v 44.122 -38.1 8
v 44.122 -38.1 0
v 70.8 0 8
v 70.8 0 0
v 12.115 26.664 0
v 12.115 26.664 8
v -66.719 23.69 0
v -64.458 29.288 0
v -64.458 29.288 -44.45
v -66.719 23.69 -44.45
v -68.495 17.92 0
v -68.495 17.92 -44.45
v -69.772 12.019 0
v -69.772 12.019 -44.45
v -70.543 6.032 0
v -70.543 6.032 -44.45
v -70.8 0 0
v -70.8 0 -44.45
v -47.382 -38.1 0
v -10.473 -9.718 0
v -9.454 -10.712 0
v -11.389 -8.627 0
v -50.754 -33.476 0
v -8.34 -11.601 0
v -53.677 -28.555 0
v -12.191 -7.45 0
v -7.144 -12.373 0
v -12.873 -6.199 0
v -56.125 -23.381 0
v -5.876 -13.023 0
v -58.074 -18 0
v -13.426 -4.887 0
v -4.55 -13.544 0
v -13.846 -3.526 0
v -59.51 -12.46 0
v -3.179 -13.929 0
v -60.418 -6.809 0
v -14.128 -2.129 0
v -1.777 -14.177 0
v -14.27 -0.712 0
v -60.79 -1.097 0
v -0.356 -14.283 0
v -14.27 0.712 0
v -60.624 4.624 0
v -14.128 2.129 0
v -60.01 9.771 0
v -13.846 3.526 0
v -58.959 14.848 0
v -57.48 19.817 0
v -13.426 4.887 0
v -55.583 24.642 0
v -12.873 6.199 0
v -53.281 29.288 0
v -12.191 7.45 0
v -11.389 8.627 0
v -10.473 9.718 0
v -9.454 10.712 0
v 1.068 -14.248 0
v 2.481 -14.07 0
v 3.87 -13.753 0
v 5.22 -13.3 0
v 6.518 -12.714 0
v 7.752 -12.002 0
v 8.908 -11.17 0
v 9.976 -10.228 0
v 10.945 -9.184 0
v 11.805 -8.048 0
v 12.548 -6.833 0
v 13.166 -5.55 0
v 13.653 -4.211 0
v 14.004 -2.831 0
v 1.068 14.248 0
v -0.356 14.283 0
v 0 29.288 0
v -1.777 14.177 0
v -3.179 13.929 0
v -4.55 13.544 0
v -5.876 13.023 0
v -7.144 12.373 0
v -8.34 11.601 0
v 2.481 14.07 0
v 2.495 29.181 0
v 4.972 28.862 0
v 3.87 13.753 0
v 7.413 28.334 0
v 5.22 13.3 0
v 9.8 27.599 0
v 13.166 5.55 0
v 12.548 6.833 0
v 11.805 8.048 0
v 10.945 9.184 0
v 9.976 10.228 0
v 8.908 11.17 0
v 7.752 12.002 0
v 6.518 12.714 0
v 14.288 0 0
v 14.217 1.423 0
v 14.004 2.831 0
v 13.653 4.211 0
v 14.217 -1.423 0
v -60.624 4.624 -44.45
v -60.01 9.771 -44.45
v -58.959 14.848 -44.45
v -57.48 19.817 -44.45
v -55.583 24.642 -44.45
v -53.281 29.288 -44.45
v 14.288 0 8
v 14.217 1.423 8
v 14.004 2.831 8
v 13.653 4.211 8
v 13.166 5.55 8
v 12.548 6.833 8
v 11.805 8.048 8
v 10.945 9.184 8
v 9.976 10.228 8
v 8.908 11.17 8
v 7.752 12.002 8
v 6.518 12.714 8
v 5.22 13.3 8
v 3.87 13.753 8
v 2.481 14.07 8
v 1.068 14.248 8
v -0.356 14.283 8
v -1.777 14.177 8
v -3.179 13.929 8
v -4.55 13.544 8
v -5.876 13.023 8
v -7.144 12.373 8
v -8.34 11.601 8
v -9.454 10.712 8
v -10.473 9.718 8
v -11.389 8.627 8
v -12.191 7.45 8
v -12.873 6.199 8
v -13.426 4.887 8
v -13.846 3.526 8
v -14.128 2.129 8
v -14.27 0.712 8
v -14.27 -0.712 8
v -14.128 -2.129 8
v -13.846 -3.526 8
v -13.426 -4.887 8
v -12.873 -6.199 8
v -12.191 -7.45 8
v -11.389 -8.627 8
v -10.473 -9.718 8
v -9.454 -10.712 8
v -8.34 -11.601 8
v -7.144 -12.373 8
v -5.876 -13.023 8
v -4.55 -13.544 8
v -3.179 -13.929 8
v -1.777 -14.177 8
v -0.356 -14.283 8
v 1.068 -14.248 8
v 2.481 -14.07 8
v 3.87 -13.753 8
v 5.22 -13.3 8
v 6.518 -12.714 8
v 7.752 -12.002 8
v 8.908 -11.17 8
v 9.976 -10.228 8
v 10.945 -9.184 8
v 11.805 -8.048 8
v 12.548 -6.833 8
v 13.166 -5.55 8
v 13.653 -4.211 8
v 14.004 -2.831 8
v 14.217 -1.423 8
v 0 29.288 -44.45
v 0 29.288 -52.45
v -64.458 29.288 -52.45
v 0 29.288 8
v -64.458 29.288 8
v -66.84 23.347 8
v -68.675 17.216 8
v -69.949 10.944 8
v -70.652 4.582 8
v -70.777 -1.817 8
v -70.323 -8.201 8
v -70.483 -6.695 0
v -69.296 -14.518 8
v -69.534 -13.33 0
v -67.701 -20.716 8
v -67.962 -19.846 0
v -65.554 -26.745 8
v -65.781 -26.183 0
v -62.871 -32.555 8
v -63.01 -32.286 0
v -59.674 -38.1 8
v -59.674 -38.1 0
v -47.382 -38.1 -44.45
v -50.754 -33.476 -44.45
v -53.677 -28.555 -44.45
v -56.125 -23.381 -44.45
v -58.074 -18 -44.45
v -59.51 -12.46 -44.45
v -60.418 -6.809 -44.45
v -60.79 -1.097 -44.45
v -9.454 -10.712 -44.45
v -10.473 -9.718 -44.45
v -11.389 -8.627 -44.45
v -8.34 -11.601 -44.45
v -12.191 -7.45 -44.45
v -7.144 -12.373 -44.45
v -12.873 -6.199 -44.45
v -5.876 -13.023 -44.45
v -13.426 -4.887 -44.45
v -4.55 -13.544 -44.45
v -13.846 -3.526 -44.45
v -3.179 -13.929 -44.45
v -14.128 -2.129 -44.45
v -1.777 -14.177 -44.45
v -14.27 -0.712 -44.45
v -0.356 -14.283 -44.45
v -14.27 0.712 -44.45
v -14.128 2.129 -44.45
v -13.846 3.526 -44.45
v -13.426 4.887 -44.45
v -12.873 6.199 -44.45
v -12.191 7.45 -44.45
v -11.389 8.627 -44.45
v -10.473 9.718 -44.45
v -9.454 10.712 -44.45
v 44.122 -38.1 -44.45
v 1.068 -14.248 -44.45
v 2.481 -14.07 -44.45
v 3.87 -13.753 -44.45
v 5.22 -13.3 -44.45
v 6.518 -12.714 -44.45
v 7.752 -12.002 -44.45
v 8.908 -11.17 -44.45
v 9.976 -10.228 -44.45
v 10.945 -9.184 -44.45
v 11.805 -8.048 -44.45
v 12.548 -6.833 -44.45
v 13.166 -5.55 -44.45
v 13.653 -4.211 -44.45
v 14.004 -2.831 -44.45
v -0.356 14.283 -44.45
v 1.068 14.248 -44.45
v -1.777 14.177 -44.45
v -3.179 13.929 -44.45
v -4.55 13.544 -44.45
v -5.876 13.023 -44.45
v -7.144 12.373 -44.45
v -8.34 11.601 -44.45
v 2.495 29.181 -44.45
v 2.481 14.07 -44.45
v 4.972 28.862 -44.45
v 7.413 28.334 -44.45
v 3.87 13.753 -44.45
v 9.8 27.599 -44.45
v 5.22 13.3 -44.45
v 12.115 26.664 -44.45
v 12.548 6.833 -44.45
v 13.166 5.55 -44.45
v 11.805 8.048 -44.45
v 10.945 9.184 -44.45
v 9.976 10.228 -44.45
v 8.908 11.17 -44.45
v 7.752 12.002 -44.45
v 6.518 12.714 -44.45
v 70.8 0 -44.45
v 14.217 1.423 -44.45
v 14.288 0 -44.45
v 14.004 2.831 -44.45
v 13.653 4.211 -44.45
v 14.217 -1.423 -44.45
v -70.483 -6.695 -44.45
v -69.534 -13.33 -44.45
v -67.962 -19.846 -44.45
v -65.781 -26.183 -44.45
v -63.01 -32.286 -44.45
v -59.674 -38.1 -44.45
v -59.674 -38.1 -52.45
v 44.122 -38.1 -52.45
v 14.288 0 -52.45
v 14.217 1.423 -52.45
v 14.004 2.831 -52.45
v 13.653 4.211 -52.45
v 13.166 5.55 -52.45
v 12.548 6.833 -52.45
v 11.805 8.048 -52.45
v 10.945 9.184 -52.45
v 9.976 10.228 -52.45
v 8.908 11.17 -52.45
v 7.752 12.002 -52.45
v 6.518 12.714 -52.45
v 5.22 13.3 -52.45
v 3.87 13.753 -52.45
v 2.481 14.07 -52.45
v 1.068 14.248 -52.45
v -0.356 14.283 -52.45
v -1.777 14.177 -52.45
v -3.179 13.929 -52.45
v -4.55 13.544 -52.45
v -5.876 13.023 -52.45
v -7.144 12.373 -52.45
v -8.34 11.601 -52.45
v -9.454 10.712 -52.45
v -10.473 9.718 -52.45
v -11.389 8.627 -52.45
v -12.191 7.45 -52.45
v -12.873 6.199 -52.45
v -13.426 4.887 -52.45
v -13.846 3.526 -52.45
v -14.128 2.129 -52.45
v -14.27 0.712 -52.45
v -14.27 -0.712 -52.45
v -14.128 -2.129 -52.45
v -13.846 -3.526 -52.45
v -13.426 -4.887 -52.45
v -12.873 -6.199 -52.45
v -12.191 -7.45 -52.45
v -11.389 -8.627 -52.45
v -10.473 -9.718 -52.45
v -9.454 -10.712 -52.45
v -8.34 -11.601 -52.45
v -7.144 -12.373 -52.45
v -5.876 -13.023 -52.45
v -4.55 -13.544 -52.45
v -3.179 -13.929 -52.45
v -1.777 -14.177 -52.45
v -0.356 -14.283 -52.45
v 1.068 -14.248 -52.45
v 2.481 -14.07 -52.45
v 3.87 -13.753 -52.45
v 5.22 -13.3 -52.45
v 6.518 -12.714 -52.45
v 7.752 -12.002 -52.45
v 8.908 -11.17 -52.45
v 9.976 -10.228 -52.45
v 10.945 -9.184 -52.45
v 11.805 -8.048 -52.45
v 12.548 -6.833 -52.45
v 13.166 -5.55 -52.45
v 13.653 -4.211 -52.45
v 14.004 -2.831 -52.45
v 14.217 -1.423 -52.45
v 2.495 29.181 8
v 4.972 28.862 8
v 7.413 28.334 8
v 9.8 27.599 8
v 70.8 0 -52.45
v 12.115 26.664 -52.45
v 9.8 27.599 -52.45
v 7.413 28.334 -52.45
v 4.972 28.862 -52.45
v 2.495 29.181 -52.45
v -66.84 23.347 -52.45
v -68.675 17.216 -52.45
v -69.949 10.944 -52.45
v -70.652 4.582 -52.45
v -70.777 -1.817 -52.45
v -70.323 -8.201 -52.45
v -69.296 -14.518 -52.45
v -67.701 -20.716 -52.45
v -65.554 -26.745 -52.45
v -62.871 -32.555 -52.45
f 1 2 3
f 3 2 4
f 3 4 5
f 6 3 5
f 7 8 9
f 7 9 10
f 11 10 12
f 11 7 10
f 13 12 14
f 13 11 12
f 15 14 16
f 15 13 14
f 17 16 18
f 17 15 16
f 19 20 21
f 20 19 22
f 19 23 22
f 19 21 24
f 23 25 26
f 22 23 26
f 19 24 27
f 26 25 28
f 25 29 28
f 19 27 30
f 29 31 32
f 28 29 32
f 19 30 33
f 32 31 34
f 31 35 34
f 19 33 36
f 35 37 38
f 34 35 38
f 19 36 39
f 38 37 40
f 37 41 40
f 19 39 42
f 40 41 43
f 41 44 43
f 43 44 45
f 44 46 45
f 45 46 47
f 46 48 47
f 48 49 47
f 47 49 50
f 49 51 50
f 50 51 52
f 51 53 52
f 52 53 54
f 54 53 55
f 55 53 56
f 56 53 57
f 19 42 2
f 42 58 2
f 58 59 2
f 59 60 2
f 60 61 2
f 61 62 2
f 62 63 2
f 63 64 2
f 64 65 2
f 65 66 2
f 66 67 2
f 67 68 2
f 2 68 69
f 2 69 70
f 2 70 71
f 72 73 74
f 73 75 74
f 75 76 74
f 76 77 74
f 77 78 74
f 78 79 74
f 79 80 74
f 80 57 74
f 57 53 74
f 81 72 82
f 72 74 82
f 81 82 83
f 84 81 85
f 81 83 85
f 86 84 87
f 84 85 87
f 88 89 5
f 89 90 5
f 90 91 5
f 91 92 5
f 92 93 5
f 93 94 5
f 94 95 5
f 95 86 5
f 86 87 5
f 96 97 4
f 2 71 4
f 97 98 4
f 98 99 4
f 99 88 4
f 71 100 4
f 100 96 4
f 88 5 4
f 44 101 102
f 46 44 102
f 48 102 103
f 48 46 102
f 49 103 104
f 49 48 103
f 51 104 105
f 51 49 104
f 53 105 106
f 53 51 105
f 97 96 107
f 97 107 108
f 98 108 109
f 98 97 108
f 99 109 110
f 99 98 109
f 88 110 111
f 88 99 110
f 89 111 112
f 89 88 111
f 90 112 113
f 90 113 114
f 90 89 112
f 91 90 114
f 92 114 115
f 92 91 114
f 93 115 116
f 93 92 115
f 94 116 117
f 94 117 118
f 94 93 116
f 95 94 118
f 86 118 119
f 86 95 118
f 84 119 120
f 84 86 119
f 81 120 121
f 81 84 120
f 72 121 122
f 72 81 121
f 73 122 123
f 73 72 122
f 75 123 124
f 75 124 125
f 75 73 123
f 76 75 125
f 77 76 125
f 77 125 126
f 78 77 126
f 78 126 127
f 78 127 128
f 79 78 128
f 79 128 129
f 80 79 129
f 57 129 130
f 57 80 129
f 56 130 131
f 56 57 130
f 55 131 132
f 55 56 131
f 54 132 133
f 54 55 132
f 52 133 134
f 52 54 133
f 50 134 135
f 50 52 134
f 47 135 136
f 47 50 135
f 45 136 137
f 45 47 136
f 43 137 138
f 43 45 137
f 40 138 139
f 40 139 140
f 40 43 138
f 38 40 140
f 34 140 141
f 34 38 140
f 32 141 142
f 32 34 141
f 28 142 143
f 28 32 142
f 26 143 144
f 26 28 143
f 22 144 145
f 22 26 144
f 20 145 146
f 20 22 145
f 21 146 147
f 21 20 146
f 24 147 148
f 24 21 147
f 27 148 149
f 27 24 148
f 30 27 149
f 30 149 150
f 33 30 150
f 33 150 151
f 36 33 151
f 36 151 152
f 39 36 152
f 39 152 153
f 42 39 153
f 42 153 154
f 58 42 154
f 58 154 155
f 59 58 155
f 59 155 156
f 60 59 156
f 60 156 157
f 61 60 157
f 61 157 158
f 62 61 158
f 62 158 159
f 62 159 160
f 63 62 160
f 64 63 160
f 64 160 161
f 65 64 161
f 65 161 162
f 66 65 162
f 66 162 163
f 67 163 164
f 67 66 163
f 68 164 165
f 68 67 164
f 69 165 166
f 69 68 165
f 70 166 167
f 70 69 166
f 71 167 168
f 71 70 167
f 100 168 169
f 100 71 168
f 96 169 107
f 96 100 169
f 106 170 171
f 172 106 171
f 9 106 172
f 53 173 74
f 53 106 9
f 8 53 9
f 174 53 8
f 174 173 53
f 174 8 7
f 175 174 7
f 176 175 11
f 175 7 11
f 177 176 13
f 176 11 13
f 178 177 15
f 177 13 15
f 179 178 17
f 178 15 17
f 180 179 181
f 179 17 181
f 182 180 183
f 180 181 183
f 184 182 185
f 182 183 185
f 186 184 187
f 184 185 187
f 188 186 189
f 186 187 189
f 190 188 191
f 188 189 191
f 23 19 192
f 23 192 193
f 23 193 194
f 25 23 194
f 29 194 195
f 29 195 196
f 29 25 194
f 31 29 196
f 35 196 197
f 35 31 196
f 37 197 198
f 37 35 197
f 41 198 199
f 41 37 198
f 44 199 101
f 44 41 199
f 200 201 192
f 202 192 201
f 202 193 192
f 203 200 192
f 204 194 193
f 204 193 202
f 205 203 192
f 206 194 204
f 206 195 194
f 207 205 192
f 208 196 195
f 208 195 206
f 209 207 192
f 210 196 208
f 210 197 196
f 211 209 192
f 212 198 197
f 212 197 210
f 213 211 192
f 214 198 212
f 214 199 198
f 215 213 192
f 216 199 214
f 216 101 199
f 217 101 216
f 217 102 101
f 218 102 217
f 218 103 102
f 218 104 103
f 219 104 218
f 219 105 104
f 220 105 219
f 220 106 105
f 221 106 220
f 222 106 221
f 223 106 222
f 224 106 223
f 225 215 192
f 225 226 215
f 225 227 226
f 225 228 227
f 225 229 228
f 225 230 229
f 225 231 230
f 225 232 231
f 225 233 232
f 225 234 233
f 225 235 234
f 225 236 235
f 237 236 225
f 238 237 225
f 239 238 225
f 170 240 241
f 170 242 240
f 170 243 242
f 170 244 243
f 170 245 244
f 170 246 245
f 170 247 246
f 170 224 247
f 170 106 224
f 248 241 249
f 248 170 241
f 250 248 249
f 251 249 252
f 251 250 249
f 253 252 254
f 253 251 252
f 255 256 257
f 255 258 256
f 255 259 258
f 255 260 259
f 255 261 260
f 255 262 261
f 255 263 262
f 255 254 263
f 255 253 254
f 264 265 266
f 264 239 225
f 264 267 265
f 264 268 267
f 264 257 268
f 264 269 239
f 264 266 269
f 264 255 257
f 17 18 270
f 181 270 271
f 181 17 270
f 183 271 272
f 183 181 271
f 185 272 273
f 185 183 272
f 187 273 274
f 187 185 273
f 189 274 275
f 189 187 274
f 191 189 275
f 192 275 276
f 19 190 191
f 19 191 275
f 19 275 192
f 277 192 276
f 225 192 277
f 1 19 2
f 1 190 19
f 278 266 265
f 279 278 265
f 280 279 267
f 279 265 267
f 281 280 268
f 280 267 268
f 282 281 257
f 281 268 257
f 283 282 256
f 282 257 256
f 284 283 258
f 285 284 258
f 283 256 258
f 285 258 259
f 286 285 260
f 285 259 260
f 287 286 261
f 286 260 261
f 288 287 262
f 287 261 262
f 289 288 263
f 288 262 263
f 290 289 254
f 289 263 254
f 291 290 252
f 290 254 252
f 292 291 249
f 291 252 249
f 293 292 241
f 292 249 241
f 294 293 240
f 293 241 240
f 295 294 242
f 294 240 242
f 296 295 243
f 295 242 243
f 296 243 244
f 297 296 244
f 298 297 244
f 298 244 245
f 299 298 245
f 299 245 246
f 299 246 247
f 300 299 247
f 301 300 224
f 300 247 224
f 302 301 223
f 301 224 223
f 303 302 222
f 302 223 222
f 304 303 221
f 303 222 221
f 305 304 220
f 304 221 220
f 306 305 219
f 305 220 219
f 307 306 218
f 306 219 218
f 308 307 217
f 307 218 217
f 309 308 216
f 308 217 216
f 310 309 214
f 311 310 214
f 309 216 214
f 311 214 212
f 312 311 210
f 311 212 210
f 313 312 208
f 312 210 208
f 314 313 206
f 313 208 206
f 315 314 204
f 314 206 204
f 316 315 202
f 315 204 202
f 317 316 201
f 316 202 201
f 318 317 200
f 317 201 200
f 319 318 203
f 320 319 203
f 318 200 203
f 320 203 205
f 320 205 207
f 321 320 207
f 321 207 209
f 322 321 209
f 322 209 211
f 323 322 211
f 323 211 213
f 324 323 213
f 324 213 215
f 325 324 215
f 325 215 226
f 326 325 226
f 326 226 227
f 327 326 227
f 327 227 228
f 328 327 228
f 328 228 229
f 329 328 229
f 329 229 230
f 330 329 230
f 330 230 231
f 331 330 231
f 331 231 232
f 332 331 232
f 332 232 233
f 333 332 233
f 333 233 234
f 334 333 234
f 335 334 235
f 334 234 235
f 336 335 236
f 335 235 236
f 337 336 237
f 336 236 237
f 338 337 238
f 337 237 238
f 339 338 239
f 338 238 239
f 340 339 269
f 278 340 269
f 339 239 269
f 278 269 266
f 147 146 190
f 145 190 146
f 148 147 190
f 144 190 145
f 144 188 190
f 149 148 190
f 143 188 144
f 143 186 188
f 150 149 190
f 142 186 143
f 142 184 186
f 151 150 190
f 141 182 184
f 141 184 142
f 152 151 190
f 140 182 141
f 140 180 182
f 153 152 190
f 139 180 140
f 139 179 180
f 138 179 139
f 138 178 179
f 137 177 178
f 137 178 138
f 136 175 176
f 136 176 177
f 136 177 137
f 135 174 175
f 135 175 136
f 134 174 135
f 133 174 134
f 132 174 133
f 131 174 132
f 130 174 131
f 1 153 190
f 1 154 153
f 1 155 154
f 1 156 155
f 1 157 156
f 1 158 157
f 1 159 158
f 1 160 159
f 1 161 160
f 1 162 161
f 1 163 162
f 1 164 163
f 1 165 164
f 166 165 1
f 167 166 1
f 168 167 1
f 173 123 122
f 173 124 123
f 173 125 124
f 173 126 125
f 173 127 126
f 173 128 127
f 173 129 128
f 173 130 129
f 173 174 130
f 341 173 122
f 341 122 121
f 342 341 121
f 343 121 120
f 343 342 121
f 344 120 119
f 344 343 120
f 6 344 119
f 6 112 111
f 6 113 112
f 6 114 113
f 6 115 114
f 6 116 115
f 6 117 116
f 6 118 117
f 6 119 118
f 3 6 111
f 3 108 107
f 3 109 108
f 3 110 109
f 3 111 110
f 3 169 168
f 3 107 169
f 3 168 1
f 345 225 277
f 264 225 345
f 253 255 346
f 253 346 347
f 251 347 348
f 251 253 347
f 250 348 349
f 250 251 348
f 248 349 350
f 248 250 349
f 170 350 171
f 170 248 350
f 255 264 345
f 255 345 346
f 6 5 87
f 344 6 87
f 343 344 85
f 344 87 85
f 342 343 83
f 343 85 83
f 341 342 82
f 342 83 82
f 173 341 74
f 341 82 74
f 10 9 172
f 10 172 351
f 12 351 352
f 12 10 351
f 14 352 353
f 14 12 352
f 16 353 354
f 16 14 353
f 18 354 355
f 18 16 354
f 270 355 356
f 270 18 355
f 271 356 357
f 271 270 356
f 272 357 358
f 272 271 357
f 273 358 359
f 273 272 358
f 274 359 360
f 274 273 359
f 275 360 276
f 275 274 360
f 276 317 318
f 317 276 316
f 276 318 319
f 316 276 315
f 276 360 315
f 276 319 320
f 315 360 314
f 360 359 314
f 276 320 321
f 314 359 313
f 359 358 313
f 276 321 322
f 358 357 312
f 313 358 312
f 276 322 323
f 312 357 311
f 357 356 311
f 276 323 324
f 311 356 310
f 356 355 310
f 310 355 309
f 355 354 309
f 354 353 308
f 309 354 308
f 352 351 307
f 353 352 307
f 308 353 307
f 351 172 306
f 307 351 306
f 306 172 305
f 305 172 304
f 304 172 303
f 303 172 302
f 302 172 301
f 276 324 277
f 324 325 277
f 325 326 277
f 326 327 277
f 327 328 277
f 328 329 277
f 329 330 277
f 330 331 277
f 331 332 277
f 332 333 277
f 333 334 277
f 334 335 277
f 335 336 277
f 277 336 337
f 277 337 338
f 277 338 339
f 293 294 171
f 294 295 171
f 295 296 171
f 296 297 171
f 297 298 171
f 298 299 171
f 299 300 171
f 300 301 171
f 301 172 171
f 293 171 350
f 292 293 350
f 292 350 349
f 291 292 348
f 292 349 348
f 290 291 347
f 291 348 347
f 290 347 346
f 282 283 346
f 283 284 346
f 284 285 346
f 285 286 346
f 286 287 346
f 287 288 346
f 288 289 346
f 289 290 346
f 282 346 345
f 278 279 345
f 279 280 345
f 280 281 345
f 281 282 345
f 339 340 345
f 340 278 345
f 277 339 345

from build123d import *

# Parameters (mm, degrees)
SKETCH1_R           = 14.2875
BOSS_EXTRUDE1_DEPTH = 8
BOSS_EXTRUDE2_START = -44.45
BOSS_EXTRUDE2_DEPTH = 44.45


with BuildPart() as part:
    # Sketch1 → Boss-Extrude1 (new body)
    with BuildSketch(Plane.XY):
        with BuildLine():
            ThreePointArc((12.115221133, 26.66419084), (6.19799028, 28.624160647), (0, 29.2875))
            Line((0, 29.2875), (-64.458376831, 29.2875))
            ThreePointArc((-64.458376831, 29.2875), (-70.622257624, -5.013654168), (-59.674366356, -38.1))
            Line((-59.674366356, -38.1), (44.122092794, -38.1))
            Line((44.122092794, -38.1), (70.8, 0))
            Line((70.8, 0), (12.115221133, 26.66419084))
        make_face()
        Circle(SKETCH1_R, mode=Mode.SUBTRACT)
    boss_extrude1 = extrude(amount=BOSS_EXTRUDE1_DEPTH)

    # Sketch1<3> → Boss-Extrude2 (add)
    with BuildSketch(Plane.XY.offset(BOSS_EXTRUDE2_START)):
        with BuildLine():
            Line((-59.674366356, -38.1), (-47.381747541, -38.1))
            ThreePointArc((-47.381747541, -38.1), (-58.074384746, -18.000162122), (-60.623939927, 4.62362495))
            ThreePointArc((-60.623939927, 4.62362495), (-58.272376031, 17.348492489), (-53.281163123, 29.2875))
            Line((-53.281163123, 29.2875), (-64.458376831, 29.2875))
            ThreePointArc((-64.458376831, 29.2875), (-69.196434445, 14.983105825), (-70.8, 0))
            ThreePointArc((-70.8, 0), (-67.96169928, -19.845589711), (-59.674366356, -38.1))
        make_face()
    extrude(amount=BOSS_EXTRUDE2_DEPTH)

    # Mirror1: Boss-Extrude1 across plane
    add(boss_extrude1.mirror(Plane(origin=(0, 0, -22.225), x_dir=(1, 0, 0), z_dir=(0, 0, -1))))


solid = part.part
